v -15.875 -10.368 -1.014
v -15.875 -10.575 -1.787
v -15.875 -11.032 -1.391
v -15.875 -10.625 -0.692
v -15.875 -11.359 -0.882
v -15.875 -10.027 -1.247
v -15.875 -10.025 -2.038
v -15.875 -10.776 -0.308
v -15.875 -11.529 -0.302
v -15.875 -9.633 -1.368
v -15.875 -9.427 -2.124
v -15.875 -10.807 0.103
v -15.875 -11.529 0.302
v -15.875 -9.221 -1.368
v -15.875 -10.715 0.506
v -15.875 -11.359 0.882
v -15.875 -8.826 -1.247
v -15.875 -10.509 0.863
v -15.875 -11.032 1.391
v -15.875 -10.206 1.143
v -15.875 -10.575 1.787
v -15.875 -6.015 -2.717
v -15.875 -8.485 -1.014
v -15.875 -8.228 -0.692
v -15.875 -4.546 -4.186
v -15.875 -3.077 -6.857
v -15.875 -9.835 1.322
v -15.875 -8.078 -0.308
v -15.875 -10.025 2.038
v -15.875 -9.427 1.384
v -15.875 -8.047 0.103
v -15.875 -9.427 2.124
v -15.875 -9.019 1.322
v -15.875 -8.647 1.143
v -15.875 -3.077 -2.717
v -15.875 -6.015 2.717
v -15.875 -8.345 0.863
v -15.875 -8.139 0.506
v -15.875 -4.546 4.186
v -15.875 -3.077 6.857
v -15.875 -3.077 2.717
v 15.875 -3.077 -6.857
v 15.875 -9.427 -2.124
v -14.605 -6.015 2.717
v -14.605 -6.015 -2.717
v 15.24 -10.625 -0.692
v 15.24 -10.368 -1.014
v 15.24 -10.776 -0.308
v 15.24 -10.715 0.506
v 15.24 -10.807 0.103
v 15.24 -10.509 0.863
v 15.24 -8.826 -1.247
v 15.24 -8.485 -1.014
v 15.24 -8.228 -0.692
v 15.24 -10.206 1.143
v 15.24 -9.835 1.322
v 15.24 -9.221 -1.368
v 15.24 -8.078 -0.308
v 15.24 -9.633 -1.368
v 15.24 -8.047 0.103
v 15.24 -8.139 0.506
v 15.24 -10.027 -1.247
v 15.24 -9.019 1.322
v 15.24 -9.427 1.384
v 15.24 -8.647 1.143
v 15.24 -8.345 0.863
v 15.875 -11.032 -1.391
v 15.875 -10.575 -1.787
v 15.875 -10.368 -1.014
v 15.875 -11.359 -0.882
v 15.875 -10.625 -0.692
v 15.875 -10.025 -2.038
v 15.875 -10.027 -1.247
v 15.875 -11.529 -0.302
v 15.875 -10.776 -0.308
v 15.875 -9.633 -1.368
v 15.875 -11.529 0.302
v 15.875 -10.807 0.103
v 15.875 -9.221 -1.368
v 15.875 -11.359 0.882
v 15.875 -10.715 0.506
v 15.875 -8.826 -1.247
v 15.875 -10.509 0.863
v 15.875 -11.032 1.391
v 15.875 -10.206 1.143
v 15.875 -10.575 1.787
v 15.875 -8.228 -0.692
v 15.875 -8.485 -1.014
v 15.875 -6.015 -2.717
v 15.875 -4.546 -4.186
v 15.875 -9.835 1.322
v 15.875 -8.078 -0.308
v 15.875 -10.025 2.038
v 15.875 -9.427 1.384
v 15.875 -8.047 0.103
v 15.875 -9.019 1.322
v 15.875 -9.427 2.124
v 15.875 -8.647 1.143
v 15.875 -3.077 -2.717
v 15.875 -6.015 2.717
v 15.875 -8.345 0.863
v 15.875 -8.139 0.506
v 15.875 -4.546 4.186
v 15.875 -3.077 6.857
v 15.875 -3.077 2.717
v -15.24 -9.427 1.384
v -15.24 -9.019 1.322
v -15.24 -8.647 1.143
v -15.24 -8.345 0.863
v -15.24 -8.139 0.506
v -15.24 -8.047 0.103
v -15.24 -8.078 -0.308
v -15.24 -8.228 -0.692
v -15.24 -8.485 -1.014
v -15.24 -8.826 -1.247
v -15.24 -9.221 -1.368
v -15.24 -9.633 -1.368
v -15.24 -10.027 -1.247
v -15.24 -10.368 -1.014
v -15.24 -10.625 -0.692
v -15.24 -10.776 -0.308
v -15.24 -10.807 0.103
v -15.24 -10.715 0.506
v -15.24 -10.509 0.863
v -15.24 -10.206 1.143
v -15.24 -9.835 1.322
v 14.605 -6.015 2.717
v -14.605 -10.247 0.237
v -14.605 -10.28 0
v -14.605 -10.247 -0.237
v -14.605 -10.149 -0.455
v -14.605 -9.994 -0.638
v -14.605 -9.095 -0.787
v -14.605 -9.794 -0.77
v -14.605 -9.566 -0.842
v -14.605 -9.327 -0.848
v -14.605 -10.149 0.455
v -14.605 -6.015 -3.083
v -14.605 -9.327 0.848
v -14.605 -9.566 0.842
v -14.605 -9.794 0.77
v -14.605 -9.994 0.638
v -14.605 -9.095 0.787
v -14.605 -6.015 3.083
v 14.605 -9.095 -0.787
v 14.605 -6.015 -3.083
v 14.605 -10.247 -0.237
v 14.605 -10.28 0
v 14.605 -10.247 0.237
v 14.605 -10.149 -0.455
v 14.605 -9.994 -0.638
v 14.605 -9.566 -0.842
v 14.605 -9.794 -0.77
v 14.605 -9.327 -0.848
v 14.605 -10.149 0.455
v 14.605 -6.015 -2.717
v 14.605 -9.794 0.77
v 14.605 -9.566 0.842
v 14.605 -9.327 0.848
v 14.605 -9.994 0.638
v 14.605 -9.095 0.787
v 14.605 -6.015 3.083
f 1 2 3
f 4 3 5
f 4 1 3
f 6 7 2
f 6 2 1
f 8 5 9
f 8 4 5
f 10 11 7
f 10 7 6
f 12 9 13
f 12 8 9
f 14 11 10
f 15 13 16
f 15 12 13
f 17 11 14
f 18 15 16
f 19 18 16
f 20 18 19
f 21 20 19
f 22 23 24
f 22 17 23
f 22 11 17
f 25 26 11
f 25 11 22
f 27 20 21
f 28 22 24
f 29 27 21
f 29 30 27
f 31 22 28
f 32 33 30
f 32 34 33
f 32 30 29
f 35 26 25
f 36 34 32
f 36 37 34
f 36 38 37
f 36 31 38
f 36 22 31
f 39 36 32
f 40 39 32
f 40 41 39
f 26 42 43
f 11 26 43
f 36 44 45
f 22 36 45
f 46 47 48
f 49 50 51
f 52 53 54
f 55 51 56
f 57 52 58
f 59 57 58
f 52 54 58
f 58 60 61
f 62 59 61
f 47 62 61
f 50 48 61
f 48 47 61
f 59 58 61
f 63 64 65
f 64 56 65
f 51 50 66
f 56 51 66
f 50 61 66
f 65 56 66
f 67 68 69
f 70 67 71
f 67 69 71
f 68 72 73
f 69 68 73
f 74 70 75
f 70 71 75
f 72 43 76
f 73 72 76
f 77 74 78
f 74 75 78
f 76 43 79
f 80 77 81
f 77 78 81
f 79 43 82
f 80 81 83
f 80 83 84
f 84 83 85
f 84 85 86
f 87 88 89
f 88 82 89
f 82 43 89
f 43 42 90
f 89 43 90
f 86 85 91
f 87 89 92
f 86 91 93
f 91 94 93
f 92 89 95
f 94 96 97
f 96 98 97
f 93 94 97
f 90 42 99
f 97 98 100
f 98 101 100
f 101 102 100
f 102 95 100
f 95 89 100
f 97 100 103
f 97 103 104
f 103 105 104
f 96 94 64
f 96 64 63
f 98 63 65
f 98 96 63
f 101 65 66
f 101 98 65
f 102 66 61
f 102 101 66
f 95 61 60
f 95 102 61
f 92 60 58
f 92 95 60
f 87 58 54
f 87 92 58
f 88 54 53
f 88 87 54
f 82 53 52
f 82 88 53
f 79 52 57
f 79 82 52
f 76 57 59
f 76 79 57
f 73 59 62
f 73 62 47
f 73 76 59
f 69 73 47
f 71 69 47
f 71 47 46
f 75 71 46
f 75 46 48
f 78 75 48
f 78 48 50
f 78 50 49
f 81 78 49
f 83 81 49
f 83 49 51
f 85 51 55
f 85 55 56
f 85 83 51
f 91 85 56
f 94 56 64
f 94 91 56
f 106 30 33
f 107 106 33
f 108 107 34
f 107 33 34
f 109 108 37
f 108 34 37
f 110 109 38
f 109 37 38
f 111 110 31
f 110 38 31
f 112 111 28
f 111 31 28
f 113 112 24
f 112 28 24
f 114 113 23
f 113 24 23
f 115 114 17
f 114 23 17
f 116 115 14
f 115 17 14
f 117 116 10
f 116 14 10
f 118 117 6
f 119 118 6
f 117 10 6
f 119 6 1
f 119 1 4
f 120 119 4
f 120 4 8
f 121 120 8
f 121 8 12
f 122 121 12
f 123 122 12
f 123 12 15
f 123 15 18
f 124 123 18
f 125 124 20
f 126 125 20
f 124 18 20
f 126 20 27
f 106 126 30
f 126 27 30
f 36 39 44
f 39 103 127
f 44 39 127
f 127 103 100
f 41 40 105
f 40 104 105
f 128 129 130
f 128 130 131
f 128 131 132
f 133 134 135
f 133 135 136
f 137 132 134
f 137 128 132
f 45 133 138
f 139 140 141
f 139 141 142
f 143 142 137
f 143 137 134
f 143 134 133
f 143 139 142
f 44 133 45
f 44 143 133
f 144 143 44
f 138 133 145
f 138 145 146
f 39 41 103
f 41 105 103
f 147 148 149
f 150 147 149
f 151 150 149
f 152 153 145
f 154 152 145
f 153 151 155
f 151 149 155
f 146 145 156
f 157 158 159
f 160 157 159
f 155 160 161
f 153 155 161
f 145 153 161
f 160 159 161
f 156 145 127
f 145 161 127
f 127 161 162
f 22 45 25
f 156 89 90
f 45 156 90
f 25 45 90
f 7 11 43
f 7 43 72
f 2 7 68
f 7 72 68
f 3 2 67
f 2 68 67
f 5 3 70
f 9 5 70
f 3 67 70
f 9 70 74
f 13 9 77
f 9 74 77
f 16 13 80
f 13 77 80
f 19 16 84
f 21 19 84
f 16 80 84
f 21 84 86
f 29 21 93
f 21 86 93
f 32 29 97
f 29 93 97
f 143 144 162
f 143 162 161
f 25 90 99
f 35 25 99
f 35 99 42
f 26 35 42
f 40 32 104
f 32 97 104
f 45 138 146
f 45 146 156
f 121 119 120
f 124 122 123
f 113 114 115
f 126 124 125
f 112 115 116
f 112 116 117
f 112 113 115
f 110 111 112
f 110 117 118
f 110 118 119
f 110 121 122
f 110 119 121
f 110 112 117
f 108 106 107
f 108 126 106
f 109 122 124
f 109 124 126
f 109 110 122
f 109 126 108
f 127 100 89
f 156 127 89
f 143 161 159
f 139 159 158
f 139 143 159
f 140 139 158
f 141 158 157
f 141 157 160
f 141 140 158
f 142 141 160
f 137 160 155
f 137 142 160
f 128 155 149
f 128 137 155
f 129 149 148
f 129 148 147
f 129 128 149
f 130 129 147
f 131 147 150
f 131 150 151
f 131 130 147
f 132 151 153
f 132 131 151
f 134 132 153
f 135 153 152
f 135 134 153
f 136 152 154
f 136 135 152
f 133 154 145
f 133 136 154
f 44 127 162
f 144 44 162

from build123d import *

# Parameters (mm, degrees)
BOSS_EXTRUDE1_DEPTH = 15.875
SHELL1_START        = -14.605
SHELL1_DEPTH        = 29.21
SKETCH3_R           = 1.383918908
CUT_EXTRUDE2_DEPTH  = 0.635


# Read off the part's stored shape, not the designer's step: Shell1
with BuildPart() as part:
    # Sketch1 → Boss-Extrude1 (new, symmetric)
    with BuildSketch(Plane(origin=(0, 0, 0), x_dir=(0, 0, -1), z_dir=(1, 0, 0))):
        with BuildLine():
            Line((6.857311765, -3.076782348), (2.123637644, -9.426782348))
            ThreePointArc((2.123637644, -9.426782348), (0, -11.550419992), (-2.123637644, -9.426782348))
            Line((-2.123637644, -9.426782348), (-6.857311765, -3.076782348))
            Line((-6.857311765, -3.076782348), (-2.717266513, -3.076782348))
            Line((-2.717266513, -3.076782348), (-4.18616331, -4.545679146))
            Line((-4.18616331, -4.545679146), (-2.717266513, -6.014575943))
            Line((-2.717266513, -6.014575943), (2.717266513, -6.014575943))
            Line((2.717266513, -6.014575943), (4.18616331, -4.545679146))
            Line((4.18616331, -4.545679146), (2.717266513, -3.076782348))
            Line((2.717266513, -3.076782348), (6.857311765, -3.076782348))
        make_face()
    extrude(amount=BOSS_EXTRUDE1_DEPTH, both=True)

    # Shell1 outline → Shell1 (cut)
    with BuildSketch(Plane.YZ.offset(SHELL1_START)):
        with BuildLine():
            Line((-6.014575943, -3.083255099), (-6.014575943, 3.083255099))
            Line((-6.014575943, 3.083255099), (-9.095341146, 0.786666357))
            ThreePointArc((-9.095341146, 0.786666357), (-10.280419992, 0), (-9.095341146, -0.786666357))
            Line((-9.095341146, -0.786666357), (-6.014575943, -3.083255099))
        make_face()
    extrude(amount=SHELL1_DEPTH, mode=Mode.SUBTRACT)

    # Sketch3 → Cut-Extrude2 (cut)
    with BuildSketch(Plane.ZY.offset(15.875)):
        with Locations((0, -9.426782348)):
            Circle(SKETCH3_R)
    cut_extrude2 = extrude(amount=-CUT_EXTRUDE2_DEPTH, mode=Mode.SUBTRACT)

    # Mirror1: Cut-Extrude2 across plane
    add(cut_extrude2.mirror(Plane(origin=(0, 0, 0), x_dir=(0, 0, 1), z_dir=(1, 0, 0))), mode=Mode.SUBTRACT)


solid = part.part
